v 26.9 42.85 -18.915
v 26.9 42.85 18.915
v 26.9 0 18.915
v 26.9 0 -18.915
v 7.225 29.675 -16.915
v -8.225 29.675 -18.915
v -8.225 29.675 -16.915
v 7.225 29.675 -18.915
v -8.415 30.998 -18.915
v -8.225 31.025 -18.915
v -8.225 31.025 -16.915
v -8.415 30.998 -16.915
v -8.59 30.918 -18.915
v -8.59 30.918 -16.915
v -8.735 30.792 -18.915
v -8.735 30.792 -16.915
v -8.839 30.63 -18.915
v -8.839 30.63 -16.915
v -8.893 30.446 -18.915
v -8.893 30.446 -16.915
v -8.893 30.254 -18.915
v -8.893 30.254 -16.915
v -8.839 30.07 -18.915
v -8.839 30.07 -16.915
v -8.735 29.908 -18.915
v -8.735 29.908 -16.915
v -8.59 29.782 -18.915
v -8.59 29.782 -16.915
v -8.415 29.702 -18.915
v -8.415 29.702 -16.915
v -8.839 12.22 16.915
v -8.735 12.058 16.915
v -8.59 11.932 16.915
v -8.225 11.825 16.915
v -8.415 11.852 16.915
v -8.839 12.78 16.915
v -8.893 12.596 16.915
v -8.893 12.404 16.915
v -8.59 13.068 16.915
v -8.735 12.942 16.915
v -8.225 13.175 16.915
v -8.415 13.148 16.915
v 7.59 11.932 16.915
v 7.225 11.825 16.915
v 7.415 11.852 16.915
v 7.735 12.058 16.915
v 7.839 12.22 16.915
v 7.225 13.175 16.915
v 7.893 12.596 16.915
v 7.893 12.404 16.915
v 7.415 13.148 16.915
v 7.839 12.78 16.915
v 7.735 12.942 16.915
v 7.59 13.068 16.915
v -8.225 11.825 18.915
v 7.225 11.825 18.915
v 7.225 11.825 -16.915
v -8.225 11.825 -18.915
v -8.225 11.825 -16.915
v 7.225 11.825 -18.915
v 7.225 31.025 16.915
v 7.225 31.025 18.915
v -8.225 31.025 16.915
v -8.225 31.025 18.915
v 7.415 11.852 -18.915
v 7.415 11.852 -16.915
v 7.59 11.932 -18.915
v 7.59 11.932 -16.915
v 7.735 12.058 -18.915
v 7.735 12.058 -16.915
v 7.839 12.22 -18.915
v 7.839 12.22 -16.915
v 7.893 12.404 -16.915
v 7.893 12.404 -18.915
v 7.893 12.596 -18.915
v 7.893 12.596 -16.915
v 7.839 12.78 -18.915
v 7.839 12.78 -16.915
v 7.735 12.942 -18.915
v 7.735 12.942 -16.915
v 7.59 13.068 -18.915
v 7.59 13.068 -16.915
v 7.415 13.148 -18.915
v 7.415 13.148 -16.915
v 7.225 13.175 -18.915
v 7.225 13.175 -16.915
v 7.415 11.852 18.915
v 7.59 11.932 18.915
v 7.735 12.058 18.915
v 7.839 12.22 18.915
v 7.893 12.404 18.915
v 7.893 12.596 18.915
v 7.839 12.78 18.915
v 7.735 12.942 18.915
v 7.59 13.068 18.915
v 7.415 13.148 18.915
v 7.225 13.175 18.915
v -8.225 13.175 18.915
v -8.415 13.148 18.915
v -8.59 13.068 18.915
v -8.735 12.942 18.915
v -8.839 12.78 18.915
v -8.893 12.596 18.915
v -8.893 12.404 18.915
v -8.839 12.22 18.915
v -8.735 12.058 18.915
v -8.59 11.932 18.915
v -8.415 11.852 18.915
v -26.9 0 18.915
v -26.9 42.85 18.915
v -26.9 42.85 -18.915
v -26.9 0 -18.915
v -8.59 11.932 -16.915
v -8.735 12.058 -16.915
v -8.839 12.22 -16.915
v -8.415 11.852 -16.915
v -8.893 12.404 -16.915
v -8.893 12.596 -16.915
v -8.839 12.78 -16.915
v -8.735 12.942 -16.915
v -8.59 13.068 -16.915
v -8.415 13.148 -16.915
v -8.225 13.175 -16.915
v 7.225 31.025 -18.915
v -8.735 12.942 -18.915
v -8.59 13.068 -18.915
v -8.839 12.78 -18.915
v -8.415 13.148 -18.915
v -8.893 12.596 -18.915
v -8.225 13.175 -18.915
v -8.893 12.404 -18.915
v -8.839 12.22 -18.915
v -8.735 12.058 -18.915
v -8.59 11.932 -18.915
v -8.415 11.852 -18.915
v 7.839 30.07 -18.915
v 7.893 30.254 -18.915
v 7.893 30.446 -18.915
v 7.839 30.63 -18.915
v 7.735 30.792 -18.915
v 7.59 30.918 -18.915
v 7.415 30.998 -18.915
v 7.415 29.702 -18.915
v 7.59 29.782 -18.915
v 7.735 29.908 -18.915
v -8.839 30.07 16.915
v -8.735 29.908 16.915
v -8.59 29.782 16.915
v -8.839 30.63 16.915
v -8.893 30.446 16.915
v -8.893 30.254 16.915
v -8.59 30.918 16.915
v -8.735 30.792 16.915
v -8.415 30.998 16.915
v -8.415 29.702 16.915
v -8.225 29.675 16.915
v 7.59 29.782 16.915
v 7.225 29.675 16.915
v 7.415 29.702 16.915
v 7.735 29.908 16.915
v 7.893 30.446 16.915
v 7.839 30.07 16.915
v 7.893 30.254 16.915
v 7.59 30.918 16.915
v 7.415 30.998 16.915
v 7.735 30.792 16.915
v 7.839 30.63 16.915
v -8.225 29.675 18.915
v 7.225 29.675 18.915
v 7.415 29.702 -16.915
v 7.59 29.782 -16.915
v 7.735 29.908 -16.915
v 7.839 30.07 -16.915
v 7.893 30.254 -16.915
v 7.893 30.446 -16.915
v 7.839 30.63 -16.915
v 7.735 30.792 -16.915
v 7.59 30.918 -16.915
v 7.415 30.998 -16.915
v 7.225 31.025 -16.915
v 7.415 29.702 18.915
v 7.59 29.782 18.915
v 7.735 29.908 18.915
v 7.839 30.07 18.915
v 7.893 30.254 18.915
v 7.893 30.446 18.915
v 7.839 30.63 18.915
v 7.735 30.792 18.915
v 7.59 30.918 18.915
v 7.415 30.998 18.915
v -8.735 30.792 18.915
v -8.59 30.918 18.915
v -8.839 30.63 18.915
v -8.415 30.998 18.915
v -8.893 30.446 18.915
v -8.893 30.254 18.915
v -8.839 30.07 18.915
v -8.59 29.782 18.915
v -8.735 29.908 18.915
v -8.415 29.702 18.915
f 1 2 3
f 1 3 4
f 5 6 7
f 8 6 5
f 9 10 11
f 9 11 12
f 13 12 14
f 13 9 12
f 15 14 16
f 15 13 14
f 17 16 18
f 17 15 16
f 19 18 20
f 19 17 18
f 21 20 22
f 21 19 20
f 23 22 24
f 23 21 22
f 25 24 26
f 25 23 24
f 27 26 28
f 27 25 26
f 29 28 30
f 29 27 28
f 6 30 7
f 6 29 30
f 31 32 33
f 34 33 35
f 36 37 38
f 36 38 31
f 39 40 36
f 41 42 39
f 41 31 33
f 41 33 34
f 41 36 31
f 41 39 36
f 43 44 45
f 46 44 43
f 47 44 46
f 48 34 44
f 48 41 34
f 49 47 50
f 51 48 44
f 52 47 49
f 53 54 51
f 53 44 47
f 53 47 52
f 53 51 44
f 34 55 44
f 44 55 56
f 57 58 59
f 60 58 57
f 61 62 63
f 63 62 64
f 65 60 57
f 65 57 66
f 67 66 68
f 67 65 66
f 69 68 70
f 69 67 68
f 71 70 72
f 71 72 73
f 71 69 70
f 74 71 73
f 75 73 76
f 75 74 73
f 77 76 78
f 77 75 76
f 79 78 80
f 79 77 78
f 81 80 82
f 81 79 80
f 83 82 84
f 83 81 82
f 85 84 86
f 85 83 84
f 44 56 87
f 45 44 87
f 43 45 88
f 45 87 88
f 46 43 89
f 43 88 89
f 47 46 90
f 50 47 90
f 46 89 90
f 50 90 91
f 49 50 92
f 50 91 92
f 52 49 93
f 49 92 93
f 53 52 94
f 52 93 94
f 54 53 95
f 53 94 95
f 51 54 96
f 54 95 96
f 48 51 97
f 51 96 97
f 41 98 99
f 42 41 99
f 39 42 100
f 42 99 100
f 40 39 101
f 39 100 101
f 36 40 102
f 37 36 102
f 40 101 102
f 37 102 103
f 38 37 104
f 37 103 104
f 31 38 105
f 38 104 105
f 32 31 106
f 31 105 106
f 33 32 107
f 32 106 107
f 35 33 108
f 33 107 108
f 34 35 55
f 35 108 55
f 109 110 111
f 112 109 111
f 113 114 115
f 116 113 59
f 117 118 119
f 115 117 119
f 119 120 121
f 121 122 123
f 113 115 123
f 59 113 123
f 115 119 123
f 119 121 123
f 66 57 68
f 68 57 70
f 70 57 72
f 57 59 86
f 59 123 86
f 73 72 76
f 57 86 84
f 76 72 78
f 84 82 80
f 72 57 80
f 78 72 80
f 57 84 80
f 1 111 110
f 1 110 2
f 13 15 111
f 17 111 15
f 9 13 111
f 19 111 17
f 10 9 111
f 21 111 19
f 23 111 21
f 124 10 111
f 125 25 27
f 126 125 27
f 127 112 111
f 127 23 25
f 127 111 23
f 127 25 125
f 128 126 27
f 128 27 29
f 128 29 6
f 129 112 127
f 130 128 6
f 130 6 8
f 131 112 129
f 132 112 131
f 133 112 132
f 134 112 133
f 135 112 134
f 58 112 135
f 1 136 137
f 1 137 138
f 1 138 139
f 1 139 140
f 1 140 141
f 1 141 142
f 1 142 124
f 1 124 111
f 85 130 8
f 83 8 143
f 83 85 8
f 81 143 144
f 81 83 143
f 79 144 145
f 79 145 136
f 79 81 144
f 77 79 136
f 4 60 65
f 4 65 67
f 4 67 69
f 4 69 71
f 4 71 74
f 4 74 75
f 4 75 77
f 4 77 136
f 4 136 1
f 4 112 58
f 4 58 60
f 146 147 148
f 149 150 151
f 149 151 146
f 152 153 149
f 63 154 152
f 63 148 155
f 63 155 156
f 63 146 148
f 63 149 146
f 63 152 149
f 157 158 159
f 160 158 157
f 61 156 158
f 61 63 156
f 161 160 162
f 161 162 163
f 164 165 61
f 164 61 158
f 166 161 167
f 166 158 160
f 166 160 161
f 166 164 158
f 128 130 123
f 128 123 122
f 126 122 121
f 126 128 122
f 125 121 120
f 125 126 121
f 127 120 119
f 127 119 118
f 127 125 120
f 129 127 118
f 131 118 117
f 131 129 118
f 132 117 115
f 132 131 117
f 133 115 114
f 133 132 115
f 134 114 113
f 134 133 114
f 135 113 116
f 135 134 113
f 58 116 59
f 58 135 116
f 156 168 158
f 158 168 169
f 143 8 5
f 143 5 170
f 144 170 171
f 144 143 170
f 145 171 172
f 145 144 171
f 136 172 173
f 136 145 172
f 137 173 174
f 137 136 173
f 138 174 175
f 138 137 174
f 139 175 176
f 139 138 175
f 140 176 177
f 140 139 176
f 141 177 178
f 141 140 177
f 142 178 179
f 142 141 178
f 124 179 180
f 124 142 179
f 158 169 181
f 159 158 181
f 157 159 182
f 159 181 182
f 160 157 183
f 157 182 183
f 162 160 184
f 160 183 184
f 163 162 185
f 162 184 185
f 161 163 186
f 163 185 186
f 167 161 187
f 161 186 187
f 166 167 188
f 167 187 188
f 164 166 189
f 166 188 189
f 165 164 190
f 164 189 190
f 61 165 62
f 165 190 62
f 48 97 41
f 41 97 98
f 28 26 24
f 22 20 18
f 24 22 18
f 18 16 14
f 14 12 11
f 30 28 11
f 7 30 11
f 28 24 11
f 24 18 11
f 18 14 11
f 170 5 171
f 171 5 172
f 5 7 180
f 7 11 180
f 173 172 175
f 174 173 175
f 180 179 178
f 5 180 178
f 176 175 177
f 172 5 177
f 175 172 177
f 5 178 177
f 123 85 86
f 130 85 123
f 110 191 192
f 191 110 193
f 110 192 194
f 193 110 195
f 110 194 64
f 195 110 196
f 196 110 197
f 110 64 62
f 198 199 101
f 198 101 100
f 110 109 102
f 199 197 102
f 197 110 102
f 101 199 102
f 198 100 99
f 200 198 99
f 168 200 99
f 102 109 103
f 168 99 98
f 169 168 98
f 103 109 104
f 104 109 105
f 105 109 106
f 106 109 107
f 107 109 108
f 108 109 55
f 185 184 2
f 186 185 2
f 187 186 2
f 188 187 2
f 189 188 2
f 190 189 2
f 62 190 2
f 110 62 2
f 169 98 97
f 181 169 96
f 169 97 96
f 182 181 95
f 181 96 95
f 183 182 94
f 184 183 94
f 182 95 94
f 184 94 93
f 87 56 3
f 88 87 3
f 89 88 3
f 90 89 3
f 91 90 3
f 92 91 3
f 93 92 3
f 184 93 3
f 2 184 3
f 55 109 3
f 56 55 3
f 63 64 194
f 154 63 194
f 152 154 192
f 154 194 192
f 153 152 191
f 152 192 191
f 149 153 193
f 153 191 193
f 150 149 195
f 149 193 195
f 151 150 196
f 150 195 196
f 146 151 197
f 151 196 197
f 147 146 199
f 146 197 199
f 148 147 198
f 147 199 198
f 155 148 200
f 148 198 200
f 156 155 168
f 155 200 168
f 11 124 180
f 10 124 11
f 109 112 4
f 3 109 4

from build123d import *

# Parameters (mm, degrees)
SKETCH1_W           = 53.8
SKETCH1_H           = 37.83
BOSS_EXTRUDE1_DEPTH = 42.85
CUT_EXTRUDE1_DEPTH  = 2


with BuildPart() as part:
    # Sketch1 → Boss-Extrude1 (new body)
    with BuildSketch(Plane(origin=(0, 0, 0), x_dir=(1, 0, 0), z_dir=(0, 1, 0))):
        Rectangle(SKETCH1_W, SKETCH1_H)
    extrude(amount=BOSS_EXTRUDE1_DEPTH)

    # Sketch2 → Cut-Extrude1 (cut)
    with BuildSketch(Plane(origin=(0, 0, -18.915), x_dir=(-1, 0, 0), z_dir=(0, 0, -1))):
        with BuildLine():
            Line((-7.225, 31.025), (8.225, 31.025))
            ThreePointArc((8.225, 31.025), (8.9, 30.35), (8.225, 29.675))
            Line((8.225, 29.675), (-7.225, 29.675))
            ThreePointArc((-7.225, 29.675), (-7.9, 30.35), (-7.225, 31.025))
        make_face()
        with BuildLine():
            Line((-7.225, 13.175), (8.225, 13.175))
            ThreePointArc((8.225, 13.175), (8.9, 12.5), (8.225, 11.825))
            Line((8.225, 11.825), (-7.225, 11.825))
            ThreePointArc((-7.225, 11.825), (-7.9, 12.5), (-7.225, 13.175))
        make_face()
    cut_extrude1 = extrude(amount=-CUT_EXTRUDE1_DEPTH, mode=Mode.SUBTRACT)

    # Mirror1: Cut-Extrude1 across plane
    add(cut_extrude1.mirror(Plane(origin=(0, 0, 0), x_dir=(1, 0, 0), z_dir=(0, 0, -1))), mode=Mode.SUBTRACT)


solid = part.part
